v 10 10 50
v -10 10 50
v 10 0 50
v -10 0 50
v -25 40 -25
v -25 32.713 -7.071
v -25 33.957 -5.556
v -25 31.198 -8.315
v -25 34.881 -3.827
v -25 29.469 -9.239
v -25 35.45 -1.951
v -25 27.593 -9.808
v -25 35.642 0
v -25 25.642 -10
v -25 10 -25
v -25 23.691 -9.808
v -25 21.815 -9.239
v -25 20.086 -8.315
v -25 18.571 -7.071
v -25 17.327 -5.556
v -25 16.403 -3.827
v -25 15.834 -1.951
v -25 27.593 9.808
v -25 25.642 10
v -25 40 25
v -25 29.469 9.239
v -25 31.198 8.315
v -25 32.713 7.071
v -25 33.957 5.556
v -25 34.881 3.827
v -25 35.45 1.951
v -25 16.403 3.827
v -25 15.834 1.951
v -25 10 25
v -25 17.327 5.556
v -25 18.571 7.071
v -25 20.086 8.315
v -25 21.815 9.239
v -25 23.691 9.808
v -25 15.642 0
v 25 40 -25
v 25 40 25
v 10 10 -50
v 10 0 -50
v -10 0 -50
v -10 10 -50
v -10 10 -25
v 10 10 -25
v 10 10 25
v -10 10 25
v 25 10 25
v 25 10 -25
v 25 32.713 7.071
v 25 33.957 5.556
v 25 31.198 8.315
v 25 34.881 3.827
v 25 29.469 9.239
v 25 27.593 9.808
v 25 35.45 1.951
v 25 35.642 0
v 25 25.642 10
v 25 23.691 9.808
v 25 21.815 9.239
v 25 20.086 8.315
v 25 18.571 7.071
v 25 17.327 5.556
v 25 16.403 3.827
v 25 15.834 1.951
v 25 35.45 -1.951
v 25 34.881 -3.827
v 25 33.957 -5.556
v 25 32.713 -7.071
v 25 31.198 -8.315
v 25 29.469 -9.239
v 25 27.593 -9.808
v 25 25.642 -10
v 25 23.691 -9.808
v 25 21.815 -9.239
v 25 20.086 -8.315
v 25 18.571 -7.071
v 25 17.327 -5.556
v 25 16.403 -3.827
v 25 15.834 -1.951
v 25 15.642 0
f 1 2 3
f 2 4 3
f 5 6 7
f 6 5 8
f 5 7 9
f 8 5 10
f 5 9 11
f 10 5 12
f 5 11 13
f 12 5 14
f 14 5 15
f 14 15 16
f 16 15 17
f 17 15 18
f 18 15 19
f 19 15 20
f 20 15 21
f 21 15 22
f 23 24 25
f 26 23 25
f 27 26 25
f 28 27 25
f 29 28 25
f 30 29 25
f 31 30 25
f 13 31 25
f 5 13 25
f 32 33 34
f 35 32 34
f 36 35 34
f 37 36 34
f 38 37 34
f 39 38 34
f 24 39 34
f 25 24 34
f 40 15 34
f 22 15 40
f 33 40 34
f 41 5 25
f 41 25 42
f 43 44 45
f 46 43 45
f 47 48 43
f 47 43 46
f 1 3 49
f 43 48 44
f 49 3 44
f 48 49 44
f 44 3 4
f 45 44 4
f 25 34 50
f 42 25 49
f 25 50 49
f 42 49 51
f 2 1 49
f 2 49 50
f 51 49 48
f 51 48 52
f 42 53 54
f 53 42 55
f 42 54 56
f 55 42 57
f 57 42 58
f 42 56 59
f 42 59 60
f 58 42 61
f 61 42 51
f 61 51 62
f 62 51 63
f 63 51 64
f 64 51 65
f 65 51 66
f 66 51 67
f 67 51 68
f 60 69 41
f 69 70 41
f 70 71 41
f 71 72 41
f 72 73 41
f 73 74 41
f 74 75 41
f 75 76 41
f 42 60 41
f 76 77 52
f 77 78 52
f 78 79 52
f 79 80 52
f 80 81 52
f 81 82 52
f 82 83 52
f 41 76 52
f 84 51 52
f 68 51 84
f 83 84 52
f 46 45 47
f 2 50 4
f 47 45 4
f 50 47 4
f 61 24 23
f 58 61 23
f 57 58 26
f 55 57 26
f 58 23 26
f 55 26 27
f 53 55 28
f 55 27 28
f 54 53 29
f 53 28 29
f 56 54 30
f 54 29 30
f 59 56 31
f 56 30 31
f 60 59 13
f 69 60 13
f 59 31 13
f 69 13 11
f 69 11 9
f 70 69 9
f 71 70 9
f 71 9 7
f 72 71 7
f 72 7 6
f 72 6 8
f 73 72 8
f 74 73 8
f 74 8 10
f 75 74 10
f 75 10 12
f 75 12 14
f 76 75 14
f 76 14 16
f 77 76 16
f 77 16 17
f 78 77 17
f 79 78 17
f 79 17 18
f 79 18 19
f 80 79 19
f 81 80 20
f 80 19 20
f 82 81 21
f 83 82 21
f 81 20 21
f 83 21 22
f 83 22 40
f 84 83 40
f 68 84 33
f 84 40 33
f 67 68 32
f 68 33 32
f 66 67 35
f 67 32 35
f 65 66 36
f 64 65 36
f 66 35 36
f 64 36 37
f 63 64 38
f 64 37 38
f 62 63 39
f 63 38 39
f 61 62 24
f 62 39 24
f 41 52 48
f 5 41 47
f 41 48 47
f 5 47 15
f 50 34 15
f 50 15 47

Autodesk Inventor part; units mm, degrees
ref_plane "YZ Plane" through (0, 0, 0) normal (1, 0, 0) x (0, 1, 0)
ref_plane "XZ Plane" through (0, 0, 0) normal (0, 1, 0) x (-1, 0, 0)
ref_plane "XY Plane" through (0, 0, 0) normal (0, 0, 1) x (1, 0, 0)
sketch "Sketch1" plane through (0, 0, 0) normal (0, 1, 0) x (-1, 0, 0)
  line L0 (-10, -50) -> (10, -50)
  line L1 (10, -50) -> (10, 50)
  line L2 (10, 50) -> (-10, 50)
  line L3 (-10, 50) -> (-10, -50)
  line L4 (-10, -50) -> (10, 50) construction
  line L5 (10, -50) -> (-10, 50) construction
  point P0 (0, 0)
  dimension "d0" = 20
  dimension "d1" = 100
extrude "Extrusion1" add sketch "Sketch1" along normal blind 10
sketch "Sketch2" plane through (0, 10, 0) normal (0, 1, 0) x (1, 0, 0)
  line L0 (25, 25) -> (-25, 25)
  line L1 (-25, 25) -> (-25, -25)
  line L2 (-25, -25) -> (25, -25)
  line L3 (25, -25) -> (25, 25)
  line L4 (25, 25) -> (-25, -25) construction
  line L5 (-25, 25) -> (25, -25) construction
  point P0 (0, 0)
  dimension "d4" = 50
  dimension "d5" = 50
extrude "Extrusion2" add sketch "Sketch2" along normal blind 30
sketch "Sketch3" plane through (-25, 10, -25) normal (-1, 0, 0) x (0, 0, 1)
  circle A0 centre (25, 15.6421) radius 10
  point P0 (25, -10)
  dimension "d8" = 20
extrude "Extrusion3" cut sketch "Sketch3" against normal through all
